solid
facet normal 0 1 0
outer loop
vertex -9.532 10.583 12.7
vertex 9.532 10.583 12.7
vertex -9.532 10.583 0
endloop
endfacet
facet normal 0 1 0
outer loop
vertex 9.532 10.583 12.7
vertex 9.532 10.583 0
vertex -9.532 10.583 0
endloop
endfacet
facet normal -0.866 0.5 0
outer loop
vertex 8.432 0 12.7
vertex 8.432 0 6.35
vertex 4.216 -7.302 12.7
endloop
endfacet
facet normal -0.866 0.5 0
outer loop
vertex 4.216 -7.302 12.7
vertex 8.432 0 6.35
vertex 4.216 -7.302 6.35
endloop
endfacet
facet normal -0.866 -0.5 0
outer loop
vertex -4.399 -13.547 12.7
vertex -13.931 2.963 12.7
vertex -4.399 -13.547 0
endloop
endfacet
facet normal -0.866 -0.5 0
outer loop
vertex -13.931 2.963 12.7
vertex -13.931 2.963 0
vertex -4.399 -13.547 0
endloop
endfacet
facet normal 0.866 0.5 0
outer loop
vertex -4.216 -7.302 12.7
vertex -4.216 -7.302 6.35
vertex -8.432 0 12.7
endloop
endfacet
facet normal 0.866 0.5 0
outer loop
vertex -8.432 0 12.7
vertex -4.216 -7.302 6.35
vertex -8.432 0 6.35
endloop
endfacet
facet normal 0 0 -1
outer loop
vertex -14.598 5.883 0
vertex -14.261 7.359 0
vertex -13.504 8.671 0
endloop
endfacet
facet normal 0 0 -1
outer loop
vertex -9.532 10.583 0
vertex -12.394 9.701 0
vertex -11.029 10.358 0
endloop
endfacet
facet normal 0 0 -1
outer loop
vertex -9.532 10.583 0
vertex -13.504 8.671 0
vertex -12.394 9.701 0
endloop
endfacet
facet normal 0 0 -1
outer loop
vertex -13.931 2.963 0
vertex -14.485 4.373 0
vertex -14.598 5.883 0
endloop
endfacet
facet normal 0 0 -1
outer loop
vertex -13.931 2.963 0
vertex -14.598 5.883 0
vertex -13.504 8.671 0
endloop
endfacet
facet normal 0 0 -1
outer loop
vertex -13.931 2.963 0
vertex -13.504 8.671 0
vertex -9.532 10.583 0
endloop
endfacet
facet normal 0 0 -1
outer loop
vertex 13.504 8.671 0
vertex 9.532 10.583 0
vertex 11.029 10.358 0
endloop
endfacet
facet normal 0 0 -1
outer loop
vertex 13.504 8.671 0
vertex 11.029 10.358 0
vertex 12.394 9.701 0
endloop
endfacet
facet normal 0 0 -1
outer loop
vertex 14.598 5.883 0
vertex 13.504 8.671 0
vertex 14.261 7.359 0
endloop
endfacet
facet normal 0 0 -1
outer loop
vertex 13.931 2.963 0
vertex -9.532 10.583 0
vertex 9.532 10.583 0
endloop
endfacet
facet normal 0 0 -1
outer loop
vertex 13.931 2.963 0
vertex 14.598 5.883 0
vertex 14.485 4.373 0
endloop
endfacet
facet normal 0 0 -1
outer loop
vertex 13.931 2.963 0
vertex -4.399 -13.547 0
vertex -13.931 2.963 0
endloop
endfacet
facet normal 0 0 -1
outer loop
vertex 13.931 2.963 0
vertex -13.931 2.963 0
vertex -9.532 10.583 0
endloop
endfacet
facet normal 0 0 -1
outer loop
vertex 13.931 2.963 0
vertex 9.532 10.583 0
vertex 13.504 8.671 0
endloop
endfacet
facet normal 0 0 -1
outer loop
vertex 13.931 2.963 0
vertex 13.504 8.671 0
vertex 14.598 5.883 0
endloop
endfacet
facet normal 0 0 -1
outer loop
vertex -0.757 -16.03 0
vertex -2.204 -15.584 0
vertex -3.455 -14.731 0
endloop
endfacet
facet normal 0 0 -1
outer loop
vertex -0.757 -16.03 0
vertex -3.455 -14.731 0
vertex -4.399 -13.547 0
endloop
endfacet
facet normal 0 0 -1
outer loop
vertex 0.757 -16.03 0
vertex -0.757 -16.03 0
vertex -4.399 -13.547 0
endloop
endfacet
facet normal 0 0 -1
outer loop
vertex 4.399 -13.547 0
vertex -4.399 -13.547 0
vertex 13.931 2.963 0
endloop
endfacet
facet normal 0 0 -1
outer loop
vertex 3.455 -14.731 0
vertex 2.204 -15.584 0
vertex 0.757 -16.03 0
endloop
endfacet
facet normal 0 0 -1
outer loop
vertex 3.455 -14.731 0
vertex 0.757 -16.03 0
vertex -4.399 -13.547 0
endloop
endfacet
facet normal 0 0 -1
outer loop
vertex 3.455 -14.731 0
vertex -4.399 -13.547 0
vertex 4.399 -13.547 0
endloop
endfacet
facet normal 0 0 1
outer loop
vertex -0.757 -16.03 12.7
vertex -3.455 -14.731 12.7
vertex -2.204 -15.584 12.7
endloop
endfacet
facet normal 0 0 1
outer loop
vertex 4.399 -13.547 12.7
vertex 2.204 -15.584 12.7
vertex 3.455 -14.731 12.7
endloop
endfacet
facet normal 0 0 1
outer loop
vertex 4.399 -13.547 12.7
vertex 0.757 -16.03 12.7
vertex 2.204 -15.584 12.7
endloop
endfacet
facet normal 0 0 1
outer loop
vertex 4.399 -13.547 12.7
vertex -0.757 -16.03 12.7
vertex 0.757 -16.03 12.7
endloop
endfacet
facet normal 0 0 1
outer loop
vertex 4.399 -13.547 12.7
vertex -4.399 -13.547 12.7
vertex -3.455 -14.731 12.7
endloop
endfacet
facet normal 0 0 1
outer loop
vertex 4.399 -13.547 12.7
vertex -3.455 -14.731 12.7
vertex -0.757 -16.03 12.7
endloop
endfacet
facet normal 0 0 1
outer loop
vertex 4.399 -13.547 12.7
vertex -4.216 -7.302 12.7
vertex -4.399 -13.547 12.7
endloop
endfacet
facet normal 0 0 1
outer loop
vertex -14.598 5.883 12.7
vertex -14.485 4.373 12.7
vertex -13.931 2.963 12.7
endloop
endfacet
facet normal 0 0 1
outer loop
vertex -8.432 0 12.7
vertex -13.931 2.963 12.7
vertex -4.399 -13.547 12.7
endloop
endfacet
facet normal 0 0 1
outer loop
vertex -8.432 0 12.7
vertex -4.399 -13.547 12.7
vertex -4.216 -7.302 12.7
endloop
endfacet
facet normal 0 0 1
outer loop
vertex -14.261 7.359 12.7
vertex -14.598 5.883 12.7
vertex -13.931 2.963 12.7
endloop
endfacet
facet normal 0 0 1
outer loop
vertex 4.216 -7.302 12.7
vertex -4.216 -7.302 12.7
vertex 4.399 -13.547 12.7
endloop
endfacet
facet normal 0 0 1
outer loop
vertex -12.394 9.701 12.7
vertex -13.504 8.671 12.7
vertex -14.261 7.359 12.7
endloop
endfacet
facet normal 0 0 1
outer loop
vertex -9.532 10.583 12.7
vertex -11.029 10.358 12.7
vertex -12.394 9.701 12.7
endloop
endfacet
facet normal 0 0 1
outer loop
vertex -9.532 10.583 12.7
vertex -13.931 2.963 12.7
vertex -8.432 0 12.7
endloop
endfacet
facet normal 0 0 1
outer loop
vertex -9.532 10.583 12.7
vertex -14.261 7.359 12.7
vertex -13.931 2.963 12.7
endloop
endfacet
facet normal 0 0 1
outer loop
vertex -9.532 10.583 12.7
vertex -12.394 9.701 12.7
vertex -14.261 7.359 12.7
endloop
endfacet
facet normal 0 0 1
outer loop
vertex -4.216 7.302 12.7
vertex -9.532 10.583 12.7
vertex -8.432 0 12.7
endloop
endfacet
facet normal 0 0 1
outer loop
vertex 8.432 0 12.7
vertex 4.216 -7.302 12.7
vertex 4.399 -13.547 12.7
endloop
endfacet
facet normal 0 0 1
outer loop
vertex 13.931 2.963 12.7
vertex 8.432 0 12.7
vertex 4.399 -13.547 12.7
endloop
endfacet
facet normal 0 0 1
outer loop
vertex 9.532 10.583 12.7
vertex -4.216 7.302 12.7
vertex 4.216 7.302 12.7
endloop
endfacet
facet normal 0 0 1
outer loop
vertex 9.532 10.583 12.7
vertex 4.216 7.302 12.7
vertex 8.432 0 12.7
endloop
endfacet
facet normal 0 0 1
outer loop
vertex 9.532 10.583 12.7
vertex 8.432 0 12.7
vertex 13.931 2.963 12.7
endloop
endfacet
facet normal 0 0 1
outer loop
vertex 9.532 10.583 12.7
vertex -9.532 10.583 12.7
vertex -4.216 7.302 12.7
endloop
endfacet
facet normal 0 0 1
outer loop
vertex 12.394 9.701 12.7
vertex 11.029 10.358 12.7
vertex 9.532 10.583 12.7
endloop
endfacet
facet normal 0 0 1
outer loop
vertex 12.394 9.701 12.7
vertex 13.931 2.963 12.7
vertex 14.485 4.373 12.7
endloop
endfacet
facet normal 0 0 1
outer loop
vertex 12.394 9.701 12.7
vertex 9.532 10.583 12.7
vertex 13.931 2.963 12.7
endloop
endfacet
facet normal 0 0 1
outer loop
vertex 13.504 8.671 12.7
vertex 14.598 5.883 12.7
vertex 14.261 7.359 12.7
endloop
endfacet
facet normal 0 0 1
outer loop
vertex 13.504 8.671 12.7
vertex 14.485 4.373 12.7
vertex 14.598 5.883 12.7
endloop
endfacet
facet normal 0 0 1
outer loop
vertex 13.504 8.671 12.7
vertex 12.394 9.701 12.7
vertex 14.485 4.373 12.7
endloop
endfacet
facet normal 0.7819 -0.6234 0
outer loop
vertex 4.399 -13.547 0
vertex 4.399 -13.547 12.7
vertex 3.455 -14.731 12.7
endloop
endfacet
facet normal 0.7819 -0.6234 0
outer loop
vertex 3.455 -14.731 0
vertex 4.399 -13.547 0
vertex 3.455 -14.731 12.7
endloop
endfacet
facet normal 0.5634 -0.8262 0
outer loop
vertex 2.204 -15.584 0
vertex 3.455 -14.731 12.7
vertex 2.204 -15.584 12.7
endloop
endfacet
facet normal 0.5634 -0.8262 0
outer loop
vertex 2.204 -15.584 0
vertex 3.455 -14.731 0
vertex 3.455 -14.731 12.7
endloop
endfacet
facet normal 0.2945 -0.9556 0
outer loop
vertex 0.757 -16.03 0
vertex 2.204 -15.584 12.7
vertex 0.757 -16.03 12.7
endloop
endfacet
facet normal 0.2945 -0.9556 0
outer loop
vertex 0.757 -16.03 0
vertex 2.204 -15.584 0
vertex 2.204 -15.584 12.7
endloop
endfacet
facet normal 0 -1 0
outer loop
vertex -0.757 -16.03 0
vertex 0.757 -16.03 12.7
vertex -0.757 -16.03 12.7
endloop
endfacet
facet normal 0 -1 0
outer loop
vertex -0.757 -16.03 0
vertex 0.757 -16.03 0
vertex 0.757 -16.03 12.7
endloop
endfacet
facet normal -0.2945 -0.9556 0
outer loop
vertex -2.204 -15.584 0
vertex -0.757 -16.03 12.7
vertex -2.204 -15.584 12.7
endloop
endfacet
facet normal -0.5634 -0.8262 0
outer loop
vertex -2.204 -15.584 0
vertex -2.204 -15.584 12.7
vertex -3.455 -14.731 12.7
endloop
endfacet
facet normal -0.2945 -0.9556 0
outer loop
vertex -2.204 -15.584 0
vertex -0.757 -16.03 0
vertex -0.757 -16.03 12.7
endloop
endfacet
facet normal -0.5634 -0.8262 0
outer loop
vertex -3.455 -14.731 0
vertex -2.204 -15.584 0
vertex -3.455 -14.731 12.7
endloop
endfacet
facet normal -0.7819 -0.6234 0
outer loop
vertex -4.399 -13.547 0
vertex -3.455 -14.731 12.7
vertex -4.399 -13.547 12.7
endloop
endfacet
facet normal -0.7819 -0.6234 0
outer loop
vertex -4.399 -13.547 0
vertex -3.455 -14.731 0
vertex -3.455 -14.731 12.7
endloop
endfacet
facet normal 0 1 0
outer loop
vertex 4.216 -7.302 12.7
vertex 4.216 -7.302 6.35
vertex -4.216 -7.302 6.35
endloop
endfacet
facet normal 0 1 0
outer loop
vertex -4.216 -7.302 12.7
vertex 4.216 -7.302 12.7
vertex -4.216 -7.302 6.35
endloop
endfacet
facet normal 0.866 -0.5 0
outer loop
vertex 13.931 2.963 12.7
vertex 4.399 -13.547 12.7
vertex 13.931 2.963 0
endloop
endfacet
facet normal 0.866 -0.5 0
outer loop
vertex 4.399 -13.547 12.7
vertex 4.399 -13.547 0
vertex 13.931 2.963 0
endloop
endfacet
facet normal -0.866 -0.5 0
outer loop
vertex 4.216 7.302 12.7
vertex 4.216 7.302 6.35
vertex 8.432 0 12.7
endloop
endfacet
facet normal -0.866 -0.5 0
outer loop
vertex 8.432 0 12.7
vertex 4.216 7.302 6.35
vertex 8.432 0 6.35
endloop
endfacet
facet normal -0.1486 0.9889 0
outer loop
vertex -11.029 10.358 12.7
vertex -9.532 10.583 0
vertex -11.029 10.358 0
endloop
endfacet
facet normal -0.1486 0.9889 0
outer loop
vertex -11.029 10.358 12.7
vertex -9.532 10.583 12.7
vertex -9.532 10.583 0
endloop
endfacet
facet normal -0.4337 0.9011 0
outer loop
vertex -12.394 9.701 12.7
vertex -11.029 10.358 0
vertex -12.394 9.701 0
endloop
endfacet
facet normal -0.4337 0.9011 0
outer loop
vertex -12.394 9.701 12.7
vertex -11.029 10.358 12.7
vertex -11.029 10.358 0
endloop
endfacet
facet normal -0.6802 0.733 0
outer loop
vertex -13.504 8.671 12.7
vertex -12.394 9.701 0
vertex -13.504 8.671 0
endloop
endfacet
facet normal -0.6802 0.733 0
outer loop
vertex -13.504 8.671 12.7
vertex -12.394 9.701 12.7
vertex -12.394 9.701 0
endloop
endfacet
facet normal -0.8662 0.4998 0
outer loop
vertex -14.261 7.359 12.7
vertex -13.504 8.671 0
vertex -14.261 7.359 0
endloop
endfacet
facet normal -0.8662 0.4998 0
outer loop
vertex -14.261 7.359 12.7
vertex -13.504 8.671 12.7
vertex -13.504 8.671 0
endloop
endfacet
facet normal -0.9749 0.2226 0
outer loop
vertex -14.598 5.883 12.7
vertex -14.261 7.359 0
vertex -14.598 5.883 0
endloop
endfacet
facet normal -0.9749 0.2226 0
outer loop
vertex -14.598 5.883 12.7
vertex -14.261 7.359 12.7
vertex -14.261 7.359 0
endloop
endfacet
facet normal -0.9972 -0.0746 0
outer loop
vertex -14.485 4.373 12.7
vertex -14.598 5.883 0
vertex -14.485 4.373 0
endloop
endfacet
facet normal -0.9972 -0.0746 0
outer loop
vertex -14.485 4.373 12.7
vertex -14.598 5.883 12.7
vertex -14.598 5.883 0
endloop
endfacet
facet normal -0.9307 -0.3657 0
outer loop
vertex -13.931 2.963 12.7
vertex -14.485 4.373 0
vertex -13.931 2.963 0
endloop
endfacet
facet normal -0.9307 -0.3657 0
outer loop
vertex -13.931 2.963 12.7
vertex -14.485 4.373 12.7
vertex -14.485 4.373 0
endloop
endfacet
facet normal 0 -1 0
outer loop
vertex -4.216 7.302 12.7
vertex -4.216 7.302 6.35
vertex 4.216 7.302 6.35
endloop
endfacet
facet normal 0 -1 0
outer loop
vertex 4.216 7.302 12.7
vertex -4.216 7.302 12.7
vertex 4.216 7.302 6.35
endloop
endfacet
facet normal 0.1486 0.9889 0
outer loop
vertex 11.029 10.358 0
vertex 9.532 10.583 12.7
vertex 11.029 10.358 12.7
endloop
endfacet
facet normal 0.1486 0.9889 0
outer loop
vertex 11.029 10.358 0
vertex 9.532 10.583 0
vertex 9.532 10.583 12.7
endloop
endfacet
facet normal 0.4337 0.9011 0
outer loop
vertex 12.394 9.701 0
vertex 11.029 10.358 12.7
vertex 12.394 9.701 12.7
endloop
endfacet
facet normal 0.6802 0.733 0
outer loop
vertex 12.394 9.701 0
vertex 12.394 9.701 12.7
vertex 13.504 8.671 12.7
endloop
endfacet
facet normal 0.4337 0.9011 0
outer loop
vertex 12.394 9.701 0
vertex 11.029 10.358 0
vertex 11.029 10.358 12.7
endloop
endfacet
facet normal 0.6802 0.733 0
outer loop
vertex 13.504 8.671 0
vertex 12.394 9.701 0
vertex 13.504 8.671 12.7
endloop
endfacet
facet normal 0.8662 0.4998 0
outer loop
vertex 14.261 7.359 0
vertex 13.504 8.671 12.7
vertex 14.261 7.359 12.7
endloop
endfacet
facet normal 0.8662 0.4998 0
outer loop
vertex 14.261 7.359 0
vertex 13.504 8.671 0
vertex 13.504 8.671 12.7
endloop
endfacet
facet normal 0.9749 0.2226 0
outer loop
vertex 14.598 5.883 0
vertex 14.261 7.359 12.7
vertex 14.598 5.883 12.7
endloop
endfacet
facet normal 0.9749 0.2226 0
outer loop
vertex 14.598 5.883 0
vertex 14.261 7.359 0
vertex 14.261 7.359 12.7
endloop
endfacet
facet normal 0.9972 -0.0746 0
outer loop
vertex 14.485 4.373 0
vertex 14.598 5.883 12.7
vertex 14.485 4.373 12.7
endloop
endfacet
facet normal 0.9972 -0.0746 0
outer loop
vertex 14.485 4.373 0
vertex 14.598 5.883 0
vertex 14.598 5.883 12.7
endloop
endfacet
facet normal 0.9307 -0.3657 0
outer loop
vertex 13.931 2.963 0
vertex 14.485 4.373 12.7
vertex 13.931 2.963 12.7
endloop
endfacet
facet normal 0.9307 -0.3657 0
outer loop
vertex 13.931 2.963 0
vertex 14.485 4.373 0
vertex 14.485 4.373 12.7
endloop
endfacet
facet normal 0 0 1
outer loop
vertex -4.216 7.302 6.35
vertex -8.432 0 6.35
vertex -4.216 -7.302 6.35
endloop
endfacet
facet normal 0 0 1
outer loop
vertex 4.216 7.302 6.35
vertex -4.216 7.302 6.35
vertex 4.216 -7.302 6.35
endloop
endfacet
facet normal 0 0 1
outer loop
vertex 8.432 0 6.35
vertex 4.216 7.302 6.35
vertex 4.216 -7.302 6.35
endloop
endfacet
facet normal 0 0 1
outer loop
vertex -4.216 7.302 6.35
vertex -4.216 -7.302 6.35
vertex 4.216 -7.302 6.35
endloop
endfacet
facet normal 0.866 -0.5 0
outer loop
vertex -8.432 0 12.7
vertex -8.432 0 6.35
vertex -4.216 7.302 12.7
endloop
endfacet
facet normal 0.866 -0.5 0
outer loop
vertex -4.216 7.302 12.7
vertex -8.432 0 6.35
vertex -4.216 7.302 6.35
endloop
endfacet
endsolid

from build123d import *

# Parameters (mm, degrees)
F1_DEPTH = 6.35
F2_DEPTH = 12.7
F4_DEPTH = 6.35
F5_R     = 5.08


with BuildPart() as f1:
    # F0 (on Top) → F1 (new body)
    with BuildSketch(Plane.XY):
        Polygon((18.330871, 10.583333), (-18.330871, 10.583333), (0, -21.166667), align=None)
        Polygon((-8.432201, 0), (-4.2161, 7.3025), (4.2161, 7.3025), (8.432201, 0), (4.2161, -7.3025), (-4.2161, -7.3025), align=None, mode=Mode.SUBTRACT)
    extrude(amount=F1_DEPTH)

    # F0 (on Top) → F2 (join)
    with BuildSketch(Plane.XY):
        Polygon((18.330871, 10.583333), (-18.330871, 10.583333), (0, -21.166667), align=None)
        Polygon((-8.432201, 0), (-4.2161, 7.3025), (4.2161, 7.3025), (8.432201, 0), (4.2161, -7.3025), (-4.2161, -7.3025), align=None, mode=Mode.SUBTRACT)
    extrude(amount=F2_DEPTH)

    # F3 (on face) → F4 (join)
    with BuildSketch(Plane(origin=(0, 0, 0), x_dir=(1, 0, 0), z_dir=(0, 0, -1))):
        Polygon((-4.2161, -7.3025), (4.2161, -7.3025), (8.432201, 0), (4.2161, 7.3025), (-4.2161, 7.3025), (-8.432201, 0), align=None)
    extrude(amount=-F4_DEPTH)

    # F5
    f5_edges = [f1.edges().sort_by_distance(p)[0] for p in [
        (18.330871, 10.583333, 6.35),
        (-18.330871, 10.583333, 6.35),
        (0, -21.166667, 6.35),
    ]]
    fillet(f5_edges, radius=F5_R)


solid = f1.part
